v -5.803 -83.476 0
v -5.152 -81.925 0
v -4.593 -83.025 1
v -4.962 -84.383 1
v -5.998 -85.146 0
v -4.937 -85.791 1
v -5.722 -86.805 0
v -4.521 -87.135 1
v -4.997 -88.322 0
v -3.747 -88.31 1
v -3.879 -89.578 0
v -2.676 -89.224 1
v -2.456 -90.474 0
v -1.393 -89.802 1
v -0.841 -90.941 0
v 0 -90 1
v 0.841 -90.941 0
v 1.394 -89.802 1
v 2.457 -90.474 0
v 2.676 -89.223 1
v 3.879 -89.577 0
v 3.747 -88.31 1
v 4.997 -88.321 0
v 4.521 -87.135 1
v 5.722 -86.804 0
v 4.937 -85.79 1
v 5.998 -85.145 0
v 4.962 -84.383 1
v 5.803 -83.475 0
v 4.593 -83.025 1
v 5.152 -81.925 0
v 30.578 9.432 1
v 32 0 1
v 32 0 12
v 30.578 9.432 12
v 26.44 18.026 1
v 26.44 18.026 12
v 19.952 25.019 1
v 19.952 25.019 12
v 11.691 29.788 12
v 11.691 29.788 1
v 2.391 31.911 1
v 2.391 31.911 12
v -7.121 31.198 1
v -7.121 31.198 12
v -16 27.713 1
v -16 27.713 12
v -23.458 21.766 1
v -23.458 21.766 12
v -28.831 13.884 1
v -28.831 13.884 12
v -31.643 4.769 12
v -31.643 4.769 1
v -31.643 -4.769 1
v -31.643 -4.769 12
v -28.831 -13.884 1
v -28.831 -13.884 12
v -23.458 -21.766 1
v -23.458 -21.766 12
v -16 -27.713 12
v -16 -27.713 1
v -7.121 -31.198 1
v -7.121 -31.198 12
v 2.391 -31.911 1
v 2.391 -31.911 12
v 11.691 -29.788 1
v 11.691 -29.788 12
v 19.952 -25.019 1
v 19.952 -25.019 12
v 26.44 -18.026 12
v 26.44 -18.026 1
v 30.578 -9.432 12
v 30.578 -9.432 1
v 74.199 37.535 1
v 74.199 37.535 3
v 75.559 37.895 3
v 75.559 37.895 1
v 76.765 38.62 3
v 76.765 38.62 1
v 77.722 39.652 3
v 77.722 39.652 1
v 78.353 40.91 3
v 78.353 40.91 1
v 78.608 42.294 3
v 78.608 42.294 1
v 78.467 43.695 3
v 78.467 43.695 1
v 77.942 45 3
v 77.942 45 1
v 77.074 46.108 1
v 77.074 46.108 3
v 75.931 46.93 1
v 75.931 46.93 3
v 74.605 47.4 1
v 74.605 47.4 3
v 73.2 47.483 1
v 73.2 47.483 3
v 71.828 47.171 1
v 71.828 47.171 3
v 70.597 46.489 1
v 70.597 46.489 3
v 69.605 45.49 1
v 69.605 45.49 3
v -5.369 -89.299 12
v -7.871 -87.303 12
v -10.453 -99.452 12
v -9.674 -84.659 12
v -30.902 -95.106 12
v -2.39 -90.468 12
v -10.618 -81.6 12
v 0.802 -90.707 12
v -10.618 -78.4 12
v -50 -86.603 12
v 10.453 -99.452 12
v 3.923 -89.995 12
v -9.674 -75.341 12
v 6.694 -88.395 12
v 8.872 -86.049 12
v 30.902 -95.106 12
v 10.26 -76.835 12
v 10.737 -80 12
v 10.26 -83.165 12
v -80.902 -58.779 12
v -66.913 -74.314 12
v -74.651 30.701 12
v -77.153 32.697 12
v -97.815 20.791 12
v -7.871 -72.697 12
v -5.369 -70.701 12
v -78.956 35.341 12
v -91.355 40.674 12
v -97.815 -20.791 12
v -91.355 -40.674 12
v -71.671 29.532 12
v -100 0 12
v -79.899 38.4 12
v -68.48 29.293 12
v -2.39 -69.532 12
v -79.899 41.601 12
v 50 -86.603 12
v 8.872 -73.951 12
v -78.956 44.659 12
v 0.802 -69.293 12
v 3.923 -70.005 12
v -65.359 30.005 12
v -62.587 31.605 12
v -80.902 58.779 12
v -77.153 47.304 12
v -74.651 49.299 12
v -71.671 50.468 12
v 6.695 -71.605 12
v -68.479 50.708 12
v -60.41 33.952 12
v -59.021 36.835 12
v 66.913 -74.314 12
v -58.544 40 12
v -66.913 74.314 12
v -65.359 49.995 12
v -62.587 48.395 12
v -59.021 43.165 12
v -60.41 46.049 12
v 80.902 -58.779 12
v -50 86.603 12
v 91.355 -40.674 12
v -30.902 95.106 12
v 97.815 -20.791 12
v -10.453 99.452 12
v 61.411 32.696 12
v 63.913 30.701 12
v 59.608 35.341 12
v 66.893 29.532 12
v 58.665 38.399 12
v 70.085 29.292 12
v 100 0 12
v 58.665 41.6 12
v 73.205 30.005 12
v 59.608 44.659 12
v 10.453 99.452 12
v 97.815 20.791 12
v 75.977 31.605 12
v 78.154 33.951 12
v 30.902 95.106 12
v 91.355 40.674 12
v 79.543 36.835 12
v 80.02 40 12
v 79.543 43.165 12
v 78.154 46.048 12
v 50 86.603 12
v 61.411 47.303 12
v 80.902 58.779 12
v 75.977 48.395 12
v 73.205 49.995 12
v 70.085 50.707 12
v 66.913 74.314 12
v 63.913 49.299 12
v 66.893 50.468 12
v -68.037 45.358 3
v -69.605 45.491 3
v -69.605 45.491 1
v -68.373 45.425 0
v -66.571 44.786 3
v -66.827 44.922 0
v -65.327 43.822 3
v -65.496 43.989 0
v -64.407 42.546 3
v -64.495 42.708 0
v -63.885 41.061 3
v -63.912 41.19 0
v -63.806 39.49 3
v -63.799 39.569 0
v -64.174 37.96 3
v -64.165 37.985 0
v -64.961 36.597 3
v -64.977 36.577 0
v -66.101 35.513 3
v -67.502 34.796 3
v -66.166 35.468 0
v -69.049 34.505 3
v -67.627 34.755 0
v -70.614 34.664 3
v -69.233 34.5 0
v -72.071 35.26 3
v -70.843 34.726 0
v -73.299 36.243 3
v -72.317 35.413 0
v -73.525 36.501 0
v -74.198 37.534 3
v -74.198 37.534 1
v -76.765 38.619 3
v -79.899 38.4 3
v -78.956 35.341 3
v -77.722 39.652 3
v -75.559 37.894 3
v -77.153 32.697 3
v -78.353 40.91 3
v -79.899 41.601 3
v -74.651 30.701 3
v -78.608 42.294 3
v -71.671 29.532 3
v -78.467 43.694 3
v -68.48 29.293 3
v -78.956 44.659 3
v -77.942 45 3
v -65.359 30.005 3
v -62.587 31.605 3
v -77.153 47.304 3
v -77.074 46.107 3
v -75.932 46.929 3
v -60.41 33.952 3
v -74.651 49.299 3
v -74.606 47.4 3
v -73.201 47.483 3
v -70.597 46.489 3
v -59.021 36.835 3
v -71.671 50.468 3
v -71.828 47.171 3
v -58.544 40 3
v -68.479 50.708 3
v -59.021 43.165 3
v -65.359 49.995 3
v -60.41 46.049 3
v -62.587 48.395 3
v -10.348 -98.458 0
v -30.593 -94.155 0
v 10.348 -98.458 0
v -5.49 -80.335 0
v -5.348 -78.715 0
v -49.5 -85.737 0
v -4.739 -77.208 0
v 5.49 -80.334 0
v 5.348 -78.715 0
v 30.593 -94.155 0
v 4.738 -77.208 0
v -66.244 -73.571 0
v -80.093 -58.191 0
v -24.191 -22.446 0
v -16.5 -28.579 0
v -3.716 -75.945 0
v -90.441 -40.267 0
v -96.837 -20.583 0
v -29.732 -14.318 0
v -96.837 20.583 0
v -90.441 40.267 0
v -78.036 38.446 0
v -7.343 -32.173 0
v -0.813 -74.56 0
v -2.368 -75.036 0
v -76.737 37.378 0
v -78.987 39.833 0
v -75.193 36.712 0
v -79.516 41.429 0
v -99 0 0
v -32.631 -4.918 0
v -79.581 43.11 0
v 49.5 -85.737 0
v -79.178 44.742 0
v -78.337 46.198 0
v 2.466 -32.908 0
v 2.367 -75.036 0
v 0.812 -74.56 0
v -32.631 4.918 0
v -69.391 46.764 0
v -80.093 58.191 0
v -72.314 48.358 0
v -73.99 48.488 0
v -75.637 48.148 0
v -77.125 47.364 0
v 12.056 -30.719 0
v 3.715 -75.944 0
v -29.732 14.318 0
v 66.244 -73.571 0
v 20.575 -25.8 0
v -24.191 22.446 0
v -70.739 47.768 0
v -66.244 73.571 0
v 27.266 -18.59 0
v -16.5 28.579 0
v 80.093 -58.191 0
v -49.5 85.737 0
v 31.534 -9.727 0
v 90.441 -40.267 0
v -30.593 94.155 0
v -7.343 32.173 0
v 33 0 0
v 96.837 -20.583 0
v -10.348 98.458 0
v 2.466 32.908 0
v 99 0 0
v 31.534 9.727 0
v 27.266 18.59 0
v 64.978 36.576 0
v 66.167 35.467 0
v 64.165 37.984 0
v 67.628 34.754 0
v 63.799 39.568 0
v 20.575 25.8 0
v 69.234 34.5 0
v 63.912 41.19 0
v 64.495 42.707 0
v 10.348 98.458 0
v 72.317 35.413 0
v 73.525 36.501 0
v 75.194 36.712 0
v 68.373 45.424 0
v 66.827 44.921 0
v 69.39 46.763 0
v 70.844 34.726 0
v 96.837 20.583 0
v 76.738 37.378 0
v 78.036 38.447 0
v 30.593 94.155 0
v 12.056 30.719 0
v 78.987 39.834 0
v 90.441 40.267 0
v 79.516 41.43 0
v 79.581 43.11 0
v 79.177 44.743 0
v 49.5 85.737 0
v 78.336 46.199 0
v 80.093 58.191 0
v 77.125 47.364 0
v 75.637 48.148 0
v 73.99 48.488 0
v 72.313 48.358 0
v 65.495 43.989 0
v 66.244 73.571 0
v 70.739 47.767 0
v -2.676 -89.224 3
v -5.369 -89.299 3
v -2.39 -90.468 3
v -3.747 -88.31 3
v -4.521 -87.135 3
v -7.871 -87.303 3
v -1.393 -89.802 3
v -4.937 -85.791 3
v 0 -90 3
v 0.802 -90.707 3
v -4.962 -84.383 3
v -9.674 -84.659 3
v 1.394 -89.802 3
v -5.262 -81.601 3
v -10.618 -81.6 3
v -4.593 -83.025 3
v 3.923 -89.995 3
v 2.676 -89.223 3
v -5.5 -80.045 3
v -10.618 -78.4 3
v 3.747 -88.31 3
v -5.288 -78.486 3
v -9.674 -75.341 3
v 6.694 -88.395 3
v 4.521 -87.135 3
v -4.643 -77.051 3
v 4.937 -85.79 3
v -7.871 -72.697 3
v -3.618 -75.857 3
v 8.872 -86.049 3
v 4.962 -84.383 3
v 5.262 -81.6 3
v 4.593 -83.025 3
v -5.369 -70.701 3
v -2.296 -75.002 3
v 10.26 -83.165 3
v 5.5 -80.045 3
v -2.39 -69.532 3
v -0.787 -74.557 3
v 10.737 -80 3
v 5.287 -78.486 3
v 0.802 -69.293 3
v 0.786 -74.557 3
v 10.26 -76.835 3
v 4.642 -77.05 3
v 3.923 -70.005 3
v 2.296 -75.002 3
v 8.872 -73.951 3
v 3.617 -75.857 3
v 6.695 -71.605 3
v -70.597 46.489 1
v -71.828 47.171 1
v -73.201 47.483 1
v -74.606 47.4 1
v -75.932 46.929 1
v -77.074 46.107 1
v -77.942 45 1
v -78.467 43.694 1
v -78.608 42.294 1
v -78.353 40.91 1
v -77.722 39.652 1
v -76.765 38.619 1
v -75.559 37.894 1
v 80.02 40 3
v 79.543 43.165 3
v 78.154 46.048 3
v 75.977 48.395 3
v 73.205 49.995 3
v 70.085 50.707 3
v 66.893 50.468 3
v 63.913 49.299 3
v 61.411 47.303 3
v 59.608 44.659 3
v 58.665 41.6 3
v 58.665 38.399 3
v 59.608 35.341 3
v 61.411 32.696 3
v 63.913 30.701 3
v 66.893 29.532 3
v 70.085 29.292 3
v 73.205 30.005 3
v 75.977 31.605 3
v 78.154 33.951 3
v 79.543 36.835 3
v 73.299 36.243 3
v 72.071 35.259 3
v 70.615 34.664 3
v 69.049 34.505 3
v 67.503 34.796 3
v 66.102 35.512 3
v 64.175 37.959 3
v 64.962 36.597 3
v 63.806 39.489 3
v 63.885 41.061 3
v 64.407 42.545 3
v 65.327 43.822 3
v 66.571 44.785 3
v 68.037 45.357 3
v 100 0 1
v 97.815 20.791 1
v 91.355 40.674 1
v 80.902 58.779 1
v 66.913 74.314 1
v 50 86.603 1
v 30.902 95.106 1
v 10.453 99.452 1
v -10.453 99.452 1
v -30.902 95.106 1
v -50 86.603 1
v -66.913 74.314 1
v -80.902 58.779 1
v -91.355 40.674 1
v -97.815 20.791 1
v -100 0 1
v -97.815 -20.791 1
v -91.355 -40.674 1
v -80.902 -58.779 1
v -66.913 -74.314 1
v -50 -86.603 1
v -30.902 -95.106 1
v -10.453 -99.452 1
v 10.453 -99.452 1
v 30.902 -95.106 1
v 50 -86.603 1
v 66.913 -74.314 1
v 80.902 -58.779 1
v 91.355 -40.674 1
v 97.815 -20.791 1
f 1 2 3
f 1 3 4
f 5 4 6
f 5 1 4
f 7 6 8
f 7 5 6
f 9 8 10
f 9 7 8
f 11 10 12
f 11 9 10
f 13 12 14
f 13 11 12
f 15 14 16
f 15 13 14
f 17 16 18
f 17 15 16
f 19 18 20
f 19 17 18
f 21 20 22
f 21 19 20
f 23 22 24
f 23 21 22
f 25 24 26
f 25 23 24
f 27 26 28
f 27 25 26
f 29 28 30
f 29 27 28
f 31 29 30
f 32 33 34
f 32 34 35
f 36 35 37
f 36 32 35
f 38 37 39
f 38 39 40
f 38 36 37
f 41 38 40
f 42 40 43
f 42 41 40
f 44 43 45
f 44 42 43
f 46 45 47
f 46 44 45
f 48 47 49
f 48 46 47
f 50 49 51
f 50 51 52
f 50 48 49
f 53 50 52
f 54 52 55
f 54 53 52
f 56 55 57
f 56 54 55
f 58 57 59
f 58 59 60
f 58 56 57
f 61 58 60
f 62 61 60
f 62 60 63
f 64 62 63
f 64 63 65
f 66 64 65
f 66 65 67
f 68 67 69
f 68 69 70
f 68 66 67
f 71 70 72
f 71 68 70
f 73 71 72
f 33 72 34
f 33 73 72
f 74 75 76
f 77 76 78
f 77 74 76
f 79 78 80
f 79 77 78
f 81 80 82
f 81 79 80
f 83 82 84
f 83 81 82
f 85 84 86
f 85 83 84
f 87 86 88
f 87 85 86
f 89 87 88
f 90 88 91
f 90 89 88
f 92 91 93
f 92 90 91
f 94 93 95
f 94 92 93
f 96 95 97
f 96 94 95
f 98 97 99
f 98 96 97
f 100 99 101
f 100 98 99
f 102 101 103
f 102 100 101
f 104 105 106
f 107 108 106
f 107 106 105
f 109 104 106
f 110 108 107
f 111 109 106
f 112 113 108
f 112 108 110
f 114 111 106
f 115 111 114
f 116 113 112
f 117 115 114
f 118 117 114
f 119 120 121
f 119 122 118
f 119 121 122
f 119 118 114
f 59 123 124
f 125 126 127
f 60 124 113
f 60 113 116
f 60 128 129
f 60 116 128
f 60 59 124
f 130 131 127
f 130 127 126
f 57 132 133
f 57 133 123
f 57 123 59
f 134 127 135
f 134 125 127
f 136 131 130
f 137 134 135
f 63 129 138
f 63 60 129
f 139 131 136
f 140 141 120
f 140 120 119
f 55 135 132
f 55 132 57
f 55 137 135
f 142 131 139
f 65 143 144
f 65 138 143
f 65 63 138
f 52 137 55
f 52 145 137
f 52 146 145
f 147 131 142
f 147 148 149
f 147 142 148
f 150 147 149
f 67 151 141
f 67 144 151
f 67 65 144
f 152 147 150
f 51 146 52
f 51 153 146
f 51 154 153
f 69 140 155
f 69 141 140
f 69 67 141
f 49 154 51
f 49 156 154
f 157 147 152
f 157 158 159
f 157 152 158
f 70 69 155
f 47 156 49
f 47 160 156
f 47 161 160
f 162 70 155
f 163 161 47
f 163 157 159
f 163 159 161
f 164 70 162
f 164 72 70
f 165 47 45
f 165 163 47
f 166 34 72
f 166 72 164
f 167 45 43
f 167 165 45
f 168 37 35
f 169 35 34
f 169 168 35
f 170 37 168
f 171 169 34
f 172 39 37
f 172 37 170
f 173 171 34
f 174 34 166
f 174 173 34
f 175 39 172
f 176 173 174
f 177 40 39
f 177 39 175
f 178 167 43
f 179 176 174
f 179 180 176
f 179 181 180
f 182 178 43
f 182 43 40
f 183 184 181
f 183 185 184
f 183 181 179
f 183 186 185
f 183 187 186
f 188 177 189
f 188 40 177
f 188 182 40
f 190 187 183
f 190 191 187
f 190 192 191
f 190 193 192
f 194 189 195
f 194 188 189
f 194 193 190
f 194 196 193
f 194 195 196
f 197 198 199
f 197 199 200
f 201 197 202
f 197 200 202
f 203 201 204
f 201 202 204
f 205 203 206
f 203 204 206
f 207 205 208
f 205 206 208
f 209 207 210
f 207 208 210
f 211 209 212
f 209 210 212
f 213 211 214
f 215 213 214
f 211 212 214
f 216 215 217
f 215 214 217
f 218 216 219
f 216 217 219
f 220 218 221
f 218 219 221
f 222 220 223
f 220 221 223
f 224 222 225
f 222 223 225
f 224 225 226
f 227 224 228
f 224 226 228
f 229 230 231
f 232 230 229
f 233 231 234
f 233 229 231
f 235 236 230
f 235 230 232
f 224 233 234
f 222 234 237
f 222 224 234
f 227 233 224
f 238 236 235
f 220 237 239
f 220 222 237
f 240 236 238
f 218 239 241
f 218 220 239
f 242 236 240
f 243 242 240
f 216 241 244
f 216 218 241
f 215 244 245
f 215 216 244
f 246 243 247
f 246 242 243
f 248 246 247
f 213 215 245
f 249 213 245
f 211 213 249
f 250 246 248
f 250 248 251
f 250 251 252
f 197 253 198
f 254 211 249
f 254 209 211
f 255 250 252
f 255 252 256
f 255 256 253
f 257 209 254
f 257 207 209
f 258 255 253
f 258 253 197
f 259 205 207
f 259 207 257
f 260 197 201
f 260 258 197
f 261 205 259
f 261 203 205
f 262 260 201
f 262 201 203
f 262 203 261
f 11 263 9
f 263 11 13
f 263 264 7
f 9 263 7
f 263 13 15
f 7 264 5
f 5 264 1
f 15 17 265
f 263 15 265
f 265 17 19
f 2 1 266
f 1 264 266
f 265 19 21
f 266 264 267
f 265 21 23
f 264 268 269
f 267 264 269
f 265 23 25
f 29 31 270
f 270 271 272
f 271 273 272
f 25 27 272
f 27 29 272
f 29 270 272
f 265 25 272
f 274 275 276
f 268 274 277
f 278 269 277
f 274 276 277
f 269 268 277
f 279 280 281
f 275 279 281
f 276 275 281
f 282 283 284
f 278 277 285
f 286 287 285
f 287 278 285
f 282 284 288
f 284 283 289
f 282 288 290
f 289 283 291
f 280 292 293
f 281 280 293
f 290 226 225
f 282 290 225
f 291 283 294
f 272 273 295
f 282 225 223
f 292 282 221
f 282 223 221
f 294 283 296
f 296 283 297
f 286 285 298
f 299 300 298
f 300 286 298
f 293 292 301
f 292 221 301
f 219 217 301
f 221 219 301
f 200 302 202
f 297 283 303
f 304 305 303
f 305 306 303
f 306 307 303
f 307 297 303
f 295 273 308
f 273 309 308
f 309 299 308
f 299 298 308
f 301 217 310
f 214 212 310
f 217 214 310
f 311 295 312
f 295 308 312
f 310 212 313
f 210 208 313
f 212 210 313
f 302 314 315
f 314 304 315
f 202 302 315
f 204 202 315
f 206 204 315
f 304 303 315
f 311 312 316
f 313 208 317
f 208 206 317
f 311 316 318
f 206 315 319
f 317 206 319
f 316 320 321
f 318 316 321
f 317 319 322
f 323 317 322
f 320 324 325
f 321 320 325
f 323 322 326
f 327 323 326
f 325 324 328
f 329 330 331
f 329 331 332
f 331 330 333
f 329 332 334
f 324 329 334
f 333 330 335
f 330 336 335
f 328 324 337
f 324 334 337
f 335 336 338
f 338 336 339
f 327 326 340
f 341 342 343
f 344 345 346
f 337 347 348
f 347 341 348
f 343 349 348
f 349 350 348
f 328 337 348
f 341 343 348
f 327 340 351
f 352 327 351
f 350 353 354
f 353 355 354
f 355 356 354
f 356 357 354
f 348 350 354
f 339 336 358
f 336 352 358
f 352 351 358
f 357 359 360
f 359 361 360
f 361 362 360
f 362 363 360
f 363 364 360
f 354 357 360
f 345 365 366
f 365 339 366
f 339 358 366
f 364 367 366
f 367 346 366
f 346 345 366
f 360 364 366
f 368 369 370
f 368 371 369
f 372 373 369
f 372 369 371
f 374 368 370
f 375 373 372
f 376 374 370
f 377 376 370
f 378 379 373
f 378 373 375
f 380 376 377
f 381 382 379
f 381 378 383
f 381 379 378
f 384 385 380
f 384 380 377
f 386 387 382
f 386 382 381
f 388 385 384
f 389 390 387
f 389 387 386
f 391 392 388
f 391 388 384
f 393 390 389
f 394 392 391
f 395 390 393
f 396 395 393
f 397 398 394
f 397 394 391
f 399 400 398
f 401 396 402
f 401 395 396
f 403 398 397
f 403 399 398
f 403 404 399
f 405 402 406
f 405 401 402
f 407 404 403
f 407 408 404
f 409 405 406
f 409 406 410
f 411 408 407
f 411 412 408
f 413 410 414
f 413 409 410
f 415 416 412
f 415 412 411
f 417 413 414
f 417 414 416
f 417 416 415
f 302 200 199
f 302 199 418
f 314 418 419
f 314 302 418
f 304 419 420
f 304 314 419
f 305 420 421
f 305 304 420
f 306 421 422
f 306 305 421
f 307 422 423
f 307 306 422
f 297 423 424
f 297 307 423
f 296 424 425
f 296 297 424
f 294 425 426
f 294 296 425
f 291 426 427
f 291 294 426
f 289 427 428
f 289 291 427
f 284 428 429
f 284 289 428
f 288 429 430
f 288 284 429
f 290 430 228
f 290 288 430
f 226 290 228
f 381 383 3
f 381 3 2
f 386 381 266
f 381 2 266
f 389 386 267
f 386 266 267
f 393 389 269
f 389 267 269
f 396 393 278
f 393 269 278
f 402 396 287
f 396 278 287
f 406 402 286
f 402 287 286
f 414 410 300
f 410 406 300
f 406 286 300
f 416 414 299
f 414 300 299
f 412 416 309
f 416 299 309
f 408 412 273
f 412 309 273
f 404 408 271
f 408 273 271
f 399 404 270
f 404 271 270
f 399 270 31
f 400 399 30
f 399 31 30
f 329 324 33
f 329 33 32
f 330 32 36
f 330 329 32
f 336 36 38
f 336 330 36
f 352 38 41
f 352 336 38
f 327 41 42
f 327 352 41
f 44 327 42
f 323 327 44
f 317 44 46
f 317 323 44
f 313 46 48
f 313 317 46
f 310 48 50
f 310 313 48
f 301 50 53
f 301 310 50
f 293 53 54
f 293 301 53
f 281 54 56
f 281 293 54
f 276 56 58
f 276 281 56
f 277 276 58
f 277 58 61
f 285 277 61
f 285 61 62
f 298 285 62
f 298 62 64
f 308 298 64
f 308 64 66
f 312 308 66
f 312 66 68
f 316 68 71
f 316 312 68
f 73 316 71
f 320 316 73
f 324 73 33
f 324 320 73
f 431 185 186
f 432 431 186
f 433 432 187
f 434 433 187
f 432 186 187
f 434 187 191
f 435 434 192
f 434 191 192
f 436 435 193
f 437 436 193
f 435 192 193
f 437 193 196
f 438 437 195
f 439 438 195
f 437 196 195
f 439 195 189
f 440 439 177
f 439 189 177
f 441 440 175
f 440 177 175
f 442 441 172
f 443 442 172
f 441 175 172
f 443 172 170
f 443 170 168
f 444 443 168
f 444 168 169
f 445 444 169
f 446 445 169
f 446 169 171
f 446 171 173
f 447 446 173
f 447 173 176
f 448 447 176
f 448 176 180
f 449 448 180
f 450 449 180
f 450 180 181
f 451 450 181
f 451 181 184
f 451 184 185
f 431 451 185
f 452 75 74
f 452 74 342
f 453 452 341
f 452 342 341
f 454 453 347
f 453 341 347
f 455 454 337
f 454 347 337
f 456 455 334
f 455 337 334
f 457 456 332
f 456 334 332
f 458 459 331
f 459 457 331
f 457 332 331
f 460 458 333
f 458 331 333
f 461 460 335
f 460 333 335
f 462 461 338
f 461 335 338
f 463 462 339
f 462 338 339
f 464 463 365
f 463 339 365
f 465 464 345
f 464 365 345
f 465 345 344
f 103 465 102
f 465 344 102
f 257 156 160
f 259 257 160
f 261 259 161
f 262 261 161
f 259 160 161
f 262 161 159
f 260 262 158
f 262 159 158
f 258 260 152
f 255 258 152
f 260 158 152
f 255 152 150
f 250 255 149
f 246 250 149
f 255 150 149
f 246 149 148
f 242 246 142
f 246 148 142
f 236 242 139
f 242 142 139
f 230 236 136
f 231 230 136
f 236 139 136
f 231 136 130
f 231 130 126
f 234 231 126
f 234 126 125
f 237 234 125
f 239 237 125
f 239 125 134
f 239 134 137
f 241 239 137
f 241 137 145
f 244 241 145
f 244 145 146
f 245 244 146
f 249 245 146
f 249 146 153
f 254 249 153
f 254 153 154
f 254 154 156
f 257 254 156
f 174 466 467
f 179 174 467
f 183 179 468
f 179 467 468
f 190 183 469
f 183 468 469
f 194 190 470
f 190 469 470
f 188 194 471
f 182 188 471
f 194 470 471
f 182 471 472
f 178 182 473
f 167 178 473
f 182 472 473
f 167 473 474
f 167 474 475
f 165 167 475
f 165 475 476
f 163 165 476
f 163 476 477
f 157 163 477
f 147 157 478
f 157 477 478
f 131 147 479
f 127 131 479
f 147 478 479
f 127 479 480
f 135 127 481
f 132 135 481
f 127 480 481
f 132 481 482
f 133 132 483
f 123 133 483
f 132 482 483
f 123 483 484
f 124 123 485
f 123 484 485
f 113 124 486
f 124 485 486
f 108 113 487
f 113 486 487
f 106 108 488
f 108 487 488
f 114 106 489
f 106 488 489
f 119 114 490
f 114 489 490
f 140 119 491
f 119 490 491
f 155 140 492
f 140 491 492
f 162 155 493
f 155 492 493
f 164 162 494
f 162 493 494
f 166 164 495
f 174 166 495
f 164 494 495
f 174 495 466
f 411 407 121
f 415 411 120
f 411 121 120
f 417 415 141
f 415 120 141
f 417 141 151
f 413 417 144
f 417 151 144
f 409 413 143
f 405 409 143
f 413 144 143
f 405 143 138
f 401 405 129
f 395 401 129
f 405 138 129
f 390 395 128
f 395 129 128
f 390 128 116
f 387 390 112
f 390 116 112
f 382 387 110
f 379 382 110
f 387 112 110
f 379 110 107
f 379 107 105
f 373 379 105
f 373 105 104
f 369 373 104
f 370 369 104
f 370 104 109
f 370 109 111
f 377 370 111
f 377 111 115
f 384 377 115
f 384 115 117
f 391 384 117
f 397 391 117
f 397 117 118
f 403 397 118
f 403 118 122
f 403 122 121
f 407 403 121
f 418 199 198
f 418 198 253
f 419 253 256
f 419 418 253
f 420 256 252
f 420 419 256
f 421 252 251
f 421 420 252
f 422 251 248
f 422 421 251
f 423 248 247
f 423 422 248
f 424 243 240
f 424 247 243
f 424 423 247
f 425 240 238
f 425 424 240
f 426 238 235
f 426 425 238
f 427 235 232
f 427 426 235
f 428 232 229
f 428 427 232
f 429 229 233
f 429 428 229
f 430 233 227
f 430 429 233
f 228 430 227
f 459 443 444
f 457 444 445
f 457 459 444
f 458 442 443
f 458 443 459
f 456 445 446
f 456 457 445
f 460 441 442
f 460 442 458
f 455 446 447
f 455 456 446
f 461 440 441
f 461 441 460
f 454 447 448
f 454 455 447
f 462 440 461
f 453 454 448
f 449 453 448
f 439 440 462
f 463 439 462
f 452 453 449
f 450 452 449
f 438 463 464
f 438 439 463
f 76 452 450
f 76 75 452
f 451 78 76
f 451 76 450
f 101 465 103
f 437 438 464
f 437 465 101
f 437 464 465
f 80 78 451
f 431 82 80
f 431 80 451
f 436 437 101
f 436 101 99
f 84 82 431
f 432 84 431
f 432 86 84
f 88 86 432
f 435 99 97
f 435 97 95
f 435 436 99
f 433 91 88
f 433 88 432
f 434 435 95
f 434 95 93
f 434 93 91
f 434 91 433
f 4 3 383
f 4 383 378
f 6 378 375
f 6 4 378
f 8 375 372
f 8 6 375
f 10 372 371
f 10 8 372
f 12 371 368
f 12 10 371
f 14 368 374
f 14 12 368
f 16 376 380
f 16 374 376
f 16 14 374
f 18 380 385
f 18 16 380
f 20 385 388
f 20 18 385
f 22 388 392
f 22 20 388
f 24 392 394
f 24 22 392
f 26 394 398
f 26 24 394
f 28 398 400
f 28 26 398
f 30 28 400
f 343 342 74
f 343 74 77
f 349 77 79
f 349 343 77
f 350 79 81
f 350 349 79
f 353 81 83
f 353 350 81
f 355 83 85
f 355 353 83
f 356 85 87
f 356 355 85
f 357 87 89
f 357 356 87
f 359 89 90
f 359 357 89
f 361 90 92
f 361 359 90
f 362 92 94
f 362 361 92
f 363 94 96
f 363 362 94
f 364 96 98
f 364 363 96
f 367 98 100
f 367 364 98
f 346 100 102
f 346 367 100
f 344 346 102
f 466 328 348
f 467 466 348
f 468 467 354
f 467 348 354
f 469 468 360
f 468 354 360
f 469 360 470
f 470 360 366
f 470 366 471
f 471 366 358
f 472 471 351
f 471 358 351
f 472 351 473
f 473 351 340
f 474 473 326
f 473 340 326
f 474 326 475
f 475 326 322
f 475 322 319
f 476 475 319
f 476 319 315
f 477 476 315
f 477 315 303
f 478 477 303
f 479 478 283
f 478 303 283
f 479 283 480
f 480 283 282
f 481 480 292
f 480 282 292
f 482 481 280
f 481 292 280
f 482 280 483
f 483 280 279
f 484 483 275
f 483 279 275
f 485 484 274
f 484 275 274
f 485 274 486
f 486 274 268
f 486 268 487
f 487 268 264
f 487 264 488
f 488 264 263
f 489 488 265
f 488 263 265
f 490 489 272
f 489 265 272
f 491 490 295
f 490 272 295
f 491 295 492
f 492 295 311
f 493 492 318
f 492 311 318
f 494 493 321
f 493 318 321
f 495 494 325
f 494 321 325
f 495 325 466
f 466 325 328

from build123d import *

# Parameters (mm, degrees)
SCHIZZO1_R                                           = 100
SCHIZZO1_R_2                                         = 32
SCHIZZO1_R_3                                         = 5
ESTRUSIONE1_DEPTH                                    = 12
SMUSSO1_SIZE                                         = 1
M10_FORO_LAMATO_PER_VITE_A_TESTA_ESAGONA_D           = 11
M10_FORO_LAMATO_PER_VITE_A_TESTA_ESAGONA_CBORE_D     = 21.475
M10_FORO_LAMATO_PER_VITE_A_TESTA_ESAGONA_CBORE_DEPTH = 9


with BuildPart() as part:
    # Schizzo1 → Estrusione1 (new body)
    with BuildSketch(Plane.XY):
        Circle(SCHIZZO1_R)
        Circle(SCHIZZO1_R_2, mode=Mode.SUBTRACT)
        with Locations((-73.612159322, 42.5)):
            Circle(SCHIZZO1_R_3, mode=Mode.SUBTRACT)
        with Locations((73.612159322, 42.5)):
            Circle(SCHIZZO1_R_3, mode=Mode.SUBTRACT)
        with Locations((0, -85)):
            Circle(SCHIZZO1_R_3, mode=Mode.SUBTRACT)
    extrude(amount=ESTRUSIONE1_DEPTH)

    # Smusso1
    smusso1_edges = [part.edges().sort_by_distance(p)[0] for p in [
        (68.612159322, 42.5, 0),
        (-5, -85, 0),
        (-100, 0, 0),
        (-32, 0, 0),
        (-78.612159322, 42.5, 0),
    ]]
    chamfer(smusso1_edges, length=SMUSSO1_SIZE)

    # M10 Foro lamato per vite a testa esagonale (parzialmente filettata)2 (through all)
    with Locations(Plane(origin=(-8.776237921, -26.129151675, 12), x_dir=(0.9999999999963068, -2.7178071316053742e-06, 0), z_dir=(0, 0, 1))):
        with Locations((-60.505865396, 66.129175527), (8.776166907, -53.870824473), (78.05819921, 66.129175527)):
            CounterBoreHole(M10_FORO_LAMATO_PER_VITE_A_TESTA_ESAGONA_D / 2, M10_FORO_LAMATO_PER_VITE_A_TESTA_ESAGONA_CBORE_D / 2, M10_FORO_LAMATO_PER_VITE_A_TESTA_ESAGONA_CBORE_DEPTH)


solid = part.part
